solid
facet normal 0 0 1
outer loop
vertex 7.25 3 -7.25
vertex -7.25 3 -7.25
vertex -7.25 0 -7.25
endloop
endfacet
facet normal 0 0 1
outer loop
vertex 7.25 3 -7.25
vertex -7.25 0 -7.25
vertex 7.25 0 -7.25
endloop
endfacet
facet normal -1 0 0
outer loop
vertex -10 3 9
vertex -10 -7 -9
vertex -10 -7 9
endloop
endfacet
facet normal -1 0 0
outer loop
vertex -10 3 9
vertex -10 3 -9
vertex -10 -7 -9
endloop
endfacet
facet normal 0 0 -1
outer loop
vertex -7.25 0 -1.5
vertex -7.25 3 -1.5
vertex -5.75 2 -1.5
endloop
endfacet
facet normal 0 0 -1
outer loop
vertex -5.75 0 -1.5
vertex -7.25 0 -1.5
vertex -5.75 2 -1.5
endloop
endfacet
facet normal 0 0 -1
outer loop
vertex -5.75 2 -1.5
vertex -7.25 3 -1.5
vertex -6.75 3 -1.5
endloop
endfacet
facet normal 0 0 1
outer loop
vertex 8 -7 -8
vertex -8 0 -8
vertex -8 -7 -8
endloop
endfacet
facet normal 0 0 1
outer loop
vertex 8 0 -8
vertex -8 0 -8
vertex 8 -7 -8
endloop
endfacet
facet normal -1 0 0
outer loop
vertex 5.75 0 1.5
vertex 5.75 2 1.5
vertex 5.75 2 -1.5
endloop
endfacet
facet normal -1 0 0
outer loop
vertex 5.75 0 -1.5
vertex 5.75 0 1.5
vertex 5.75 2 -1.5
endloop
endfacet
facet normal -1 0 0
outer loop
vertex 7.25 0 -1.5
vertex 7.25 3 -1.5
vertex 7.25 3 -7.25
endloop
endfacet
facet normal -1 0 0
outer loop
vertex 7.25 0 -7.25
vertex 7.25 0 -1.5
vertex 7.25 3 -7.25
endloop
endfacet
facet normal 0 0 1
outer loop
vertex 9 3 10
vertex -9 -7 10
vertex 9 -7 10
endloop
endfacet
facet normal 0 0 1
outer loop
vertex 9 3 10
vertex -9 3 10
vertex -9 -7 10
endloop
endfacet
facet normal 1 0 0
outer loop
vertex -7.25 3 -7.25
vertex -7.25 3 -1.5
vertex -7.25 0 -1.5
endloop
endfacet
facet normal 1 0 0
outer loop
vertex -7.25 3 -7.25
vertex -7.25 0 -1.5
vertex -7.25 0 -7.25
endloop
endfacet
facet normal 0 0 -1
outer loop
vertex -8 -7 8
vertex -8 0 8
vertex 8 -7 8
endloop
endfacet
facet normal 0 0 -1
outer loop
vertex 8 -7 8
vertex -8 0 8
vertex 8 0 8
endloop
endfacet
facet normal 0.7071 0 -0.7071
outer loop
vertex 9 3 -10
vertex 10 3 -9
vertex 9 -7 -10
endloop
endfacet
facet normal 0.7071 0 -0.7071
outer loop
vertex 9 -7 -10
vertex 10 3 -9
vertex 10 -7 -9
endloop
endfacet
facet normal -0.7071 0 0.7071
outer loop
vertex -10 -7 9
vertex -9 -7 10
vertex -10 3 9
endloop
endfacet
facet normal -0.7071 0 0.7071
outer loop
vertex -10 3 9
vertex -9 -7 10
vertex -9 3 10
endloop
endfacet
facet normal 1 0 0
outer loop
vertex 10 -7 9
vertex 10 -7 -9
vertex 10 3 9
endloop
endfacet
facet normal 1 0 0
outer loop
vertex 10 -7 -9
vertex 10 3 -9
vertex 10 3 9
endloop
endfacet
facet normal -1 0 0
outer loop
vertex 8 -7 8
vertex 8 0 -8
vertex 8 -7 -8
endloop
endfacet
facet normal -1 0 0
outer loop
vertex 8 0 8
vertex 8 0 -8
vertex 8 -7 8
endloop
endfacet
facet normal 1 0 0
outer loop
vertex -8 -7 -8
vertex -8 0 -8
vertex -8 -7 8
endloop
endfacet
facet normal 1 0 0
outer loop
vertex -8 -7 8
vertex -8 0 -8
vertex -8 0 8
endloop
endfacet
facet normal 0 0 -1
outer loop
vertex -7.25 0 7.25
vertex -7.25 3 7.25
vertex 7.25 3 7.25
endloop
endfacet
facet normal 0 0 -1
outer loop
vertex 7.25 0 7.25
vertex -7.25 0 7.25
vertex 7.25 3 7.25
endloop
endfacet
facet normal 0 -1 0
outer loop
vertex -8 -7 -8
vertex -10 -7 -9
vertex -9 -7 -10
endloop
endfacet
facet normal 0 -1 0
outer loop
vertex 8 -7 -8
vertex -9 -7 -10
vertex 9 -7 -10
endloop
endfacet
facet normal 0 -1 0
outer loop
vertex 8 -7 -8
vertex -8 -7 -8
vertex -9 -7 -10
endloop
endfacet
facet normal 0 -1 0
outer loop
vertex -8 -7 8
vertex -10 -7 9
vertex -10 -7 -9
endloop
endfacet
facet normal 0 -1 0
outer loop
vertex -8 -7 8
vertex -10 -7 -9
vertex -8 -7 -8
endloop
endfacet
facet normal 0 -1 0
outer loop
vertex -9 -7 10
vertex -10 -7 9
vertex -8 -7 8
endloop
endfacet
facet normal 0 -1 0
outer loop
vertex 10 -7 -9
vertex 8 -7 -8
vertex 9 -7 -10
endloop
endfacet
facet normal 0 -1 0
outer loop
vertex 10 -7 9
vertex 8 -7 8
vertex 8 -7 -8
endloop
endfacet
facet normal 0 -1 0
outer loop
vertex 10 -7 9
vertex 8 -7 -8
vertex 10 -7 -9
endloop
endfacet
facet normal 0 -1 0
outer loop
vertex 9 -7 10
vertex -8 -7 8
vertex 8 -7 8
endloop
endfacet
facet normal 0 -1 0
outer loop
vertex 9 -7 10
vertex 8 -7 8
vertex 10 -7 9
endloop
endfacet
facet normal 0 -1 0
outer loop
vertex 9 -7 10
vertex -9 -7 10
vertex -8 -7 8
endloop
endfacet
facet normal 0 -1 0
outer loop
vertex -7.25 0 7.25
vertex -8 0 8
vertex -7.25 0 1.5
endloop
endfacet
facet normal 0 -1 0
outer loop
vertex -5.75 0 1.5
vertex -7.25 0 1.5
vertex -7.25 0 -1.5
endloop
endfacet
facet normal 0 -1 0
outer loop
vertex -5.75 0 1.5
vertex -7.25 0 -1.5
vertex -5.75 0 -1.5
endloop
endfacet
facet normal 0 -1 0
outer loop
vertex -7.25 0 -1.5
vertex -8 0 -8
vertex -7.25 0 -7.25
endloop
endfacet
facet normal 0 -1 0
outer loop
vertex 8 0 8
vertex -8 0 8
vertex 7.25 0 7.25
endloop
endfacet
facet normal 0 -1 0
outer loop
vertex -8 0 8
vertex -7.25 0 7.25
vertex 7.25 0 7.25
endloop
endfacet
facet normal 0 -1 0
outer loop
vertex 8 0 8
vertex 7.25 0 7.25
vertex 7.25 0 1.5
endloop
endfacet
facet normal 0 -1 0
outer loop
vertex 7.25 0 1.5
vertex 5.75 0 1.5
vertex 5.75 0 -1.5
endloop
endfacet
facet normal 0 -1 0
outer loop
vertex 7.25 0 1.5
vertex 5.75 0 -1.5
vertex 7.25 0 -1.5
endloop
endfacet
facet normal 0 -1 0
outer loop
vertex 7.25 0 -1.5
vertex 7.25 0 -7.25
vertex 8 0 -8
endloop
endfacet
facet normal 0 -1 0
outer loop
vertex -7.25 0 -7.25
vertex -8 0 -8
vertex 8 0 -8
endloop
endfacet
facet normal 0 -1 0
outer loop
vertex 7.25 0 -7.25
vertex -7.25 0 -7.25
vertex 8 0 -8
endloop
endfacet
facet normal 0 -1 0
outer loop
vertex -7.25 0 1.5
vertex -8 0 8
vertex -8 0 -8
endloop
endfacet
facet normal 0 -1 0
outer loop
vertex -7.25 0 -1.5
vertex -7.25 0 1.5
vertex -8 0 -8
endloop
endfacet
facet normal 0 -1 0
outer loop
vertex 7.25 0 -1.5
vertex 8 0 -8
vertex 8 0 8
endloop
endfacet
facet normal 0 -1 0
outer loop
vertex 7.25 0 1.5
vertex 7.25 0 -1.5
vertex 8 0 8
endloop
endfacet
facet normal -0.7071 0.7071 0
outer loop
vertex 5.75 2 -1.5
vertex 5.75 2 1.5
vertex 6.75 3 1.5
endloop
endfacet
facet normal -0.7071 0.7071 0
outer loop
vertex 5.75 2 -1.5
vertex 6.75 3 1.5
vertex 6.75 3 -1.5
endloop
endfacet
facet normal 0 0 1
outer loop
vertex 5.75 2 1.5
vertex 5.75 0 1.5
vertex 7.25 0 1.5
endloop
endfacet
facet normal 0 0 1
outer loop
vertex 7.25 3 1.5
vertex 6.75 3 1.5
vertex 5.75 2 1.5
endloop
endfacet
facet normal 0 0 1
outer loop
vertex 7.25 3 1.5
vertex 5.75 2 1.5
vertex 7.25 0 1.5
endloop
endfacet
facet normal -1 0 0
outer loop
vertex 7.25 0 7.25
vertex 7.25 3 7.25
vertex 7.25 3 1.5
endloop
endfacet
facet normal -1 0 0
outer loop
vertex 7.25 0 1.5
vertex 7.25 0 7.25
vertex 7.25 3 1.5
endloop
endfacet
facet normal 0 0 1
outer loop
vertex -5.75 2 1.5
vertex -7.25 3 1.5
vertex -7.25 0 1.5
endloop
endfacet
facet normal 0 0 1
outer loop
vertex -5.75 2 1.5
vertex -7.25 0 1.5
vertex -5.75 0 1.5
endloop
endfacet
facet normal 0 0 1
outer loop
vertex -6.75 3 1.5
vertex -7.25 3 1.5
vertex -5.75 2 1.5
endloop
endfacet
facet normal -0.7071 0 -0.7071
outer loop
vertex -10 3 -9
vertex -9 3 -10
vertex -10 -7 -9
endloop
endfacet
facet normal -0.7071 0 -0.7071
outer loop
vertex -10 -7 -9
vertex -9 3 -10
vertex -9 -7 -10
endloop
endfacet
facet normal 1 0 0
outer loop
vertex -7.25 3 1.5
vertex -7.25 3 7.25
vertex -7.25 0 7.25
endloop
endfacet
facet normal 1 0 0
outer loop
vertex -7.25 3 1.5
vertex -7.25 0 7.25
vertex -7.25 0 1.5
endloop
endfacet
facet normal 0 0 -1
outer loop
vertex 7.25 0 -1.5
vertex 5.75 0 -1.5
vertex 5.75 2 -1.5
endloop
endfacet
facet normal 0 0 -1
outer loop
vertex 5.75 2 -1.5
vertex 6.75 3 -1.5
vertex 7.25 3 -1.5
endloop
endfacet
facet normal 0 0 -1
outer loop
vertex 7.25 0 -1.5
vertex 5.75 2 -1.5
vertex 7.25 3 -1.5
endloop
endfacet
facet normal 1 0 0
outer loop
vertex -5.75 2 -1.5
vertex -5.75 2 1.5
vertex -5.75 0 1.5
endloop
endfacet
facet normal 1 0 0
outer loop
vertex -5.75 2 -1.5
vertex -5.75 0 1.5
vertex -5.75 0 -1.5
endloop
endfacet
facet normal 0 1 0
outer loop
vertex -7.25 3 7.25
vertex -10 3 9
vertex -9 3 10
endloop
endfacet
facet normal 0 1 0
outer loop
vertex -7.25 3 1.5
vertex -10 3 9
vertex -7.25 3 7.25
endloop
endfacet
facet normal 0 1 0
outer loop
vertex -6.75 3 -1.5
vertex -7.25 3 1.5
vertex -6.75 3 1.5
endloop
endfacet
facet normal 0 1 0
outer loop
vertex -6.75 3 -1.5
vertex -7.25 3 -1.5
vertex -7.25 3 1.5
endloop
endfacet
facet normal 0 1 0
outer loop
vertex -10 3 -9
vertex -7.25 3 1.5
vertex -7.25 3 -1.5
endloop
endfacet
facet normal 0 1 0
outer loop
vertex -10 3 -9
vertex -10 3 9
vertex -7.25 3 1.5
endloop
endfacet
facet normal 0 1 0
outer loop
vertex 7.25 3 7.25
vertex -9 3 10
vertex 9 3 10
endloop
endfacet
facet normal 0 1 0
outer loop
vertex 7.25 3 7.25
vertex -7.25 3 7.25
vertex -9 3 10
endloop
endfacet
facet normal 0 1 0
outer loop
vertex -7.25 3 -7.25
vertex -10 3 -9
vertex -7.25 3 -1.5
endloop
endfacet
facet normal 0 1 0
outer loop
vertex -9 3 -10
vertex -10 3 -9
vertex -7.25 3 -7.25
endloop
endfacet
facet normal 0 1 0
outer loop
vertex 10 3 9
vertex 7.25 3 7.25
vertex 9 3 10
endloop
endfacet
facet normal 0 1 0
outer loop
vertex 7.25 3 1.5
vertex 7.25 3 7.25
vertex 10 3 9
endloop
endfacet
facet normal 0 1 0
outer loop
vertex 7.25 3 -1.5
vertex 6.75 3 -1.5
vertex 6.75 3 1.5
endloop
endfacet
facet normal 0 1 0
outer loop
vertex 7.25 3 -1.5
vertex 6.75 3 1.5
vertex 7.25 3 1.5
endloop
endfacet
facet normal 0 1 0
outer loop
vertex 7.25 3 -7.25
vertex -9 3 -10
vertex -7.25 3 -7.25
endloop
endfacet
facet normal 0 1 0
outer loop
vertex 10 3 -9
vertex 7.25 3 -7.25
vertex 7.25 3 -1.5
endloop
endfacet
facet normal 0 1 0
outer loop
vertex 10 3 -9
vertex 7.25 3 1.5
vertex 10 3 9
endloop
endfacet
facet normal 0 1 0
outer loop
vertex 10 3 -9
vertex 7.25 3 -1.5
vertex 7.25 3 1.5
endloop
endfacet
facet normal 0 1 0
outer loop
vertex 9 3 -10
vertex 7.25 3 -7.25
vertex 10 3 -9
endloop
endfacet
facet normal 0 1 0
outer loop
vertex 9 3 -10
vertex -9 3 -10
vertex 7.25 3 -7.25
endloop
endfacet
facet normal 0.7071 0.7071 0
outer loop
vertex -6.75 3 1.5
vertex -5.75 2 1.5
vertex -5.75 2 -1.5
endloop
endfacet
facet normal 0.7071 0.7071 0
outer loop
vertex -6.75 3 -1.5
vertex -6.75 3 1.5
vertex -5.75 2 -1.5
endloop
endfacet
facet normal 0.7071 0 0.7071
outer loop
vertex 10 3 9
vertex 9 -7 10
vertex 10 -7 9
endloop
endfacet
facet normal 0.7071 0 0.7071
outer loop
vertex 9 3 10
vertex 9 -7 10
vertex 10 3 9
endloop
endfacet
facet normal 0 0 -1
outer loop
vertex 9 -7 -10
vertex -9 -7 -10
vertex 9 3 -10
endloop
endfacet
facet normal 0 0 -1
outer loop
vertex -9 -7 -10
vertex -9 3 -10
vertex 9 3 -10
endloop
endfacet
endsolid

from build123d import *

# Parameters (mm, degrees)
SKETCH1_W           = 20
SKETCH1_H           = 20
BOSS_EXTRUDE1_DEPTH = 3
SKETCH2_W           = 14.5
SKETCH2_H           = 14.5
CUT_EXTRUDE1_DEPTH  = 3
SKETCH3_W           = 1.5
SKETCH3_H           = 3
BOSS_EXTRUDE2_DEPTH = 3
CHAMFER1_SIZE       = 1
SKETCH4_W           = 20
SKETCH4_H           = 20
SKETCH4_W_2         = 16
SKETCH4_H_2         = 16
BOSS_EXTRUDE3_DEPTH = 7
CHAMFER2_SIZE       = 1


with BuildPart() as part:
    # Sketch1 → Boss-Extrude1 (new body)
    with BuildSketch(Plane(origin=(0, 0, 0), x_dir=(1, 0, 0), z_dir=(0, 1, 0))):
        Rectangle(SKETCH1_W, SKETCH1_H)
    extrude(amount=BOSS_EXTRUDE1_DEPTH)

    # Sketch2 → Cut-Extrude1 (cut)
    with BuildSketch(Plane(origin=(0, 3, 0), x_dir=(1, 0, 0), z_dir=(0, 1, 0))):
        Rectangle(SKETCH2_W, SKETCH2_H)
    extrude(amount=-CUT_EXTRUDE1_DEPTH, mode=Mode.SUBTRACT)

    # Sketch3 → Boss-Extrude2 (add)
    with BuildSketch(Plane(origin=(0, 3, 0), x_dir=(1, 0, 0), z_dir=(0, 1, 0))):
        with Locations((6.5, 0)):
            Rectangle(SKETCH3_W, SKETCH3_H)
        with Locations((-6.5, 0)):
            Rectangle(SKETCH3_W, SKETCH3_H)
    extrude(amount=-BOSS_EXTRUDE2_DEPTH)

    # Chamfer1
    chamfer1_edges = [part.edges().sort_by_distance(p)[0] for p in [
        (5.75, 3, 0),
        (-5.75, 3, 0),
    ]]
    chamfer(chamfer1_edges, length=CHAMFER1_SIZE)

    # Sketch4 → Boss-Extrude3 (add)
    with BuildSketch(Plane.XZ):
        Rectangle(SKETCH4_W, SKETCH4_H)
        Rectangle(SKETCH4_W_2, SKETCH4_H_2, mode=Mode.SUBTRACT)
    extrude(amount=BOSS_EXTRUDE3_DEPTH)

    # Chamfer2
    chamfer2_edges = [part.edges().sort_by_distance(p)[0] for p in [
        (10, -2, 10),
        (-10, -2, 10),
        (-10, -2, -10),
        (10, -2, -10),
    ]]
    chamfer(chamfer2_edges, length=CHAMFER2_SIZE)


solid = part.part
